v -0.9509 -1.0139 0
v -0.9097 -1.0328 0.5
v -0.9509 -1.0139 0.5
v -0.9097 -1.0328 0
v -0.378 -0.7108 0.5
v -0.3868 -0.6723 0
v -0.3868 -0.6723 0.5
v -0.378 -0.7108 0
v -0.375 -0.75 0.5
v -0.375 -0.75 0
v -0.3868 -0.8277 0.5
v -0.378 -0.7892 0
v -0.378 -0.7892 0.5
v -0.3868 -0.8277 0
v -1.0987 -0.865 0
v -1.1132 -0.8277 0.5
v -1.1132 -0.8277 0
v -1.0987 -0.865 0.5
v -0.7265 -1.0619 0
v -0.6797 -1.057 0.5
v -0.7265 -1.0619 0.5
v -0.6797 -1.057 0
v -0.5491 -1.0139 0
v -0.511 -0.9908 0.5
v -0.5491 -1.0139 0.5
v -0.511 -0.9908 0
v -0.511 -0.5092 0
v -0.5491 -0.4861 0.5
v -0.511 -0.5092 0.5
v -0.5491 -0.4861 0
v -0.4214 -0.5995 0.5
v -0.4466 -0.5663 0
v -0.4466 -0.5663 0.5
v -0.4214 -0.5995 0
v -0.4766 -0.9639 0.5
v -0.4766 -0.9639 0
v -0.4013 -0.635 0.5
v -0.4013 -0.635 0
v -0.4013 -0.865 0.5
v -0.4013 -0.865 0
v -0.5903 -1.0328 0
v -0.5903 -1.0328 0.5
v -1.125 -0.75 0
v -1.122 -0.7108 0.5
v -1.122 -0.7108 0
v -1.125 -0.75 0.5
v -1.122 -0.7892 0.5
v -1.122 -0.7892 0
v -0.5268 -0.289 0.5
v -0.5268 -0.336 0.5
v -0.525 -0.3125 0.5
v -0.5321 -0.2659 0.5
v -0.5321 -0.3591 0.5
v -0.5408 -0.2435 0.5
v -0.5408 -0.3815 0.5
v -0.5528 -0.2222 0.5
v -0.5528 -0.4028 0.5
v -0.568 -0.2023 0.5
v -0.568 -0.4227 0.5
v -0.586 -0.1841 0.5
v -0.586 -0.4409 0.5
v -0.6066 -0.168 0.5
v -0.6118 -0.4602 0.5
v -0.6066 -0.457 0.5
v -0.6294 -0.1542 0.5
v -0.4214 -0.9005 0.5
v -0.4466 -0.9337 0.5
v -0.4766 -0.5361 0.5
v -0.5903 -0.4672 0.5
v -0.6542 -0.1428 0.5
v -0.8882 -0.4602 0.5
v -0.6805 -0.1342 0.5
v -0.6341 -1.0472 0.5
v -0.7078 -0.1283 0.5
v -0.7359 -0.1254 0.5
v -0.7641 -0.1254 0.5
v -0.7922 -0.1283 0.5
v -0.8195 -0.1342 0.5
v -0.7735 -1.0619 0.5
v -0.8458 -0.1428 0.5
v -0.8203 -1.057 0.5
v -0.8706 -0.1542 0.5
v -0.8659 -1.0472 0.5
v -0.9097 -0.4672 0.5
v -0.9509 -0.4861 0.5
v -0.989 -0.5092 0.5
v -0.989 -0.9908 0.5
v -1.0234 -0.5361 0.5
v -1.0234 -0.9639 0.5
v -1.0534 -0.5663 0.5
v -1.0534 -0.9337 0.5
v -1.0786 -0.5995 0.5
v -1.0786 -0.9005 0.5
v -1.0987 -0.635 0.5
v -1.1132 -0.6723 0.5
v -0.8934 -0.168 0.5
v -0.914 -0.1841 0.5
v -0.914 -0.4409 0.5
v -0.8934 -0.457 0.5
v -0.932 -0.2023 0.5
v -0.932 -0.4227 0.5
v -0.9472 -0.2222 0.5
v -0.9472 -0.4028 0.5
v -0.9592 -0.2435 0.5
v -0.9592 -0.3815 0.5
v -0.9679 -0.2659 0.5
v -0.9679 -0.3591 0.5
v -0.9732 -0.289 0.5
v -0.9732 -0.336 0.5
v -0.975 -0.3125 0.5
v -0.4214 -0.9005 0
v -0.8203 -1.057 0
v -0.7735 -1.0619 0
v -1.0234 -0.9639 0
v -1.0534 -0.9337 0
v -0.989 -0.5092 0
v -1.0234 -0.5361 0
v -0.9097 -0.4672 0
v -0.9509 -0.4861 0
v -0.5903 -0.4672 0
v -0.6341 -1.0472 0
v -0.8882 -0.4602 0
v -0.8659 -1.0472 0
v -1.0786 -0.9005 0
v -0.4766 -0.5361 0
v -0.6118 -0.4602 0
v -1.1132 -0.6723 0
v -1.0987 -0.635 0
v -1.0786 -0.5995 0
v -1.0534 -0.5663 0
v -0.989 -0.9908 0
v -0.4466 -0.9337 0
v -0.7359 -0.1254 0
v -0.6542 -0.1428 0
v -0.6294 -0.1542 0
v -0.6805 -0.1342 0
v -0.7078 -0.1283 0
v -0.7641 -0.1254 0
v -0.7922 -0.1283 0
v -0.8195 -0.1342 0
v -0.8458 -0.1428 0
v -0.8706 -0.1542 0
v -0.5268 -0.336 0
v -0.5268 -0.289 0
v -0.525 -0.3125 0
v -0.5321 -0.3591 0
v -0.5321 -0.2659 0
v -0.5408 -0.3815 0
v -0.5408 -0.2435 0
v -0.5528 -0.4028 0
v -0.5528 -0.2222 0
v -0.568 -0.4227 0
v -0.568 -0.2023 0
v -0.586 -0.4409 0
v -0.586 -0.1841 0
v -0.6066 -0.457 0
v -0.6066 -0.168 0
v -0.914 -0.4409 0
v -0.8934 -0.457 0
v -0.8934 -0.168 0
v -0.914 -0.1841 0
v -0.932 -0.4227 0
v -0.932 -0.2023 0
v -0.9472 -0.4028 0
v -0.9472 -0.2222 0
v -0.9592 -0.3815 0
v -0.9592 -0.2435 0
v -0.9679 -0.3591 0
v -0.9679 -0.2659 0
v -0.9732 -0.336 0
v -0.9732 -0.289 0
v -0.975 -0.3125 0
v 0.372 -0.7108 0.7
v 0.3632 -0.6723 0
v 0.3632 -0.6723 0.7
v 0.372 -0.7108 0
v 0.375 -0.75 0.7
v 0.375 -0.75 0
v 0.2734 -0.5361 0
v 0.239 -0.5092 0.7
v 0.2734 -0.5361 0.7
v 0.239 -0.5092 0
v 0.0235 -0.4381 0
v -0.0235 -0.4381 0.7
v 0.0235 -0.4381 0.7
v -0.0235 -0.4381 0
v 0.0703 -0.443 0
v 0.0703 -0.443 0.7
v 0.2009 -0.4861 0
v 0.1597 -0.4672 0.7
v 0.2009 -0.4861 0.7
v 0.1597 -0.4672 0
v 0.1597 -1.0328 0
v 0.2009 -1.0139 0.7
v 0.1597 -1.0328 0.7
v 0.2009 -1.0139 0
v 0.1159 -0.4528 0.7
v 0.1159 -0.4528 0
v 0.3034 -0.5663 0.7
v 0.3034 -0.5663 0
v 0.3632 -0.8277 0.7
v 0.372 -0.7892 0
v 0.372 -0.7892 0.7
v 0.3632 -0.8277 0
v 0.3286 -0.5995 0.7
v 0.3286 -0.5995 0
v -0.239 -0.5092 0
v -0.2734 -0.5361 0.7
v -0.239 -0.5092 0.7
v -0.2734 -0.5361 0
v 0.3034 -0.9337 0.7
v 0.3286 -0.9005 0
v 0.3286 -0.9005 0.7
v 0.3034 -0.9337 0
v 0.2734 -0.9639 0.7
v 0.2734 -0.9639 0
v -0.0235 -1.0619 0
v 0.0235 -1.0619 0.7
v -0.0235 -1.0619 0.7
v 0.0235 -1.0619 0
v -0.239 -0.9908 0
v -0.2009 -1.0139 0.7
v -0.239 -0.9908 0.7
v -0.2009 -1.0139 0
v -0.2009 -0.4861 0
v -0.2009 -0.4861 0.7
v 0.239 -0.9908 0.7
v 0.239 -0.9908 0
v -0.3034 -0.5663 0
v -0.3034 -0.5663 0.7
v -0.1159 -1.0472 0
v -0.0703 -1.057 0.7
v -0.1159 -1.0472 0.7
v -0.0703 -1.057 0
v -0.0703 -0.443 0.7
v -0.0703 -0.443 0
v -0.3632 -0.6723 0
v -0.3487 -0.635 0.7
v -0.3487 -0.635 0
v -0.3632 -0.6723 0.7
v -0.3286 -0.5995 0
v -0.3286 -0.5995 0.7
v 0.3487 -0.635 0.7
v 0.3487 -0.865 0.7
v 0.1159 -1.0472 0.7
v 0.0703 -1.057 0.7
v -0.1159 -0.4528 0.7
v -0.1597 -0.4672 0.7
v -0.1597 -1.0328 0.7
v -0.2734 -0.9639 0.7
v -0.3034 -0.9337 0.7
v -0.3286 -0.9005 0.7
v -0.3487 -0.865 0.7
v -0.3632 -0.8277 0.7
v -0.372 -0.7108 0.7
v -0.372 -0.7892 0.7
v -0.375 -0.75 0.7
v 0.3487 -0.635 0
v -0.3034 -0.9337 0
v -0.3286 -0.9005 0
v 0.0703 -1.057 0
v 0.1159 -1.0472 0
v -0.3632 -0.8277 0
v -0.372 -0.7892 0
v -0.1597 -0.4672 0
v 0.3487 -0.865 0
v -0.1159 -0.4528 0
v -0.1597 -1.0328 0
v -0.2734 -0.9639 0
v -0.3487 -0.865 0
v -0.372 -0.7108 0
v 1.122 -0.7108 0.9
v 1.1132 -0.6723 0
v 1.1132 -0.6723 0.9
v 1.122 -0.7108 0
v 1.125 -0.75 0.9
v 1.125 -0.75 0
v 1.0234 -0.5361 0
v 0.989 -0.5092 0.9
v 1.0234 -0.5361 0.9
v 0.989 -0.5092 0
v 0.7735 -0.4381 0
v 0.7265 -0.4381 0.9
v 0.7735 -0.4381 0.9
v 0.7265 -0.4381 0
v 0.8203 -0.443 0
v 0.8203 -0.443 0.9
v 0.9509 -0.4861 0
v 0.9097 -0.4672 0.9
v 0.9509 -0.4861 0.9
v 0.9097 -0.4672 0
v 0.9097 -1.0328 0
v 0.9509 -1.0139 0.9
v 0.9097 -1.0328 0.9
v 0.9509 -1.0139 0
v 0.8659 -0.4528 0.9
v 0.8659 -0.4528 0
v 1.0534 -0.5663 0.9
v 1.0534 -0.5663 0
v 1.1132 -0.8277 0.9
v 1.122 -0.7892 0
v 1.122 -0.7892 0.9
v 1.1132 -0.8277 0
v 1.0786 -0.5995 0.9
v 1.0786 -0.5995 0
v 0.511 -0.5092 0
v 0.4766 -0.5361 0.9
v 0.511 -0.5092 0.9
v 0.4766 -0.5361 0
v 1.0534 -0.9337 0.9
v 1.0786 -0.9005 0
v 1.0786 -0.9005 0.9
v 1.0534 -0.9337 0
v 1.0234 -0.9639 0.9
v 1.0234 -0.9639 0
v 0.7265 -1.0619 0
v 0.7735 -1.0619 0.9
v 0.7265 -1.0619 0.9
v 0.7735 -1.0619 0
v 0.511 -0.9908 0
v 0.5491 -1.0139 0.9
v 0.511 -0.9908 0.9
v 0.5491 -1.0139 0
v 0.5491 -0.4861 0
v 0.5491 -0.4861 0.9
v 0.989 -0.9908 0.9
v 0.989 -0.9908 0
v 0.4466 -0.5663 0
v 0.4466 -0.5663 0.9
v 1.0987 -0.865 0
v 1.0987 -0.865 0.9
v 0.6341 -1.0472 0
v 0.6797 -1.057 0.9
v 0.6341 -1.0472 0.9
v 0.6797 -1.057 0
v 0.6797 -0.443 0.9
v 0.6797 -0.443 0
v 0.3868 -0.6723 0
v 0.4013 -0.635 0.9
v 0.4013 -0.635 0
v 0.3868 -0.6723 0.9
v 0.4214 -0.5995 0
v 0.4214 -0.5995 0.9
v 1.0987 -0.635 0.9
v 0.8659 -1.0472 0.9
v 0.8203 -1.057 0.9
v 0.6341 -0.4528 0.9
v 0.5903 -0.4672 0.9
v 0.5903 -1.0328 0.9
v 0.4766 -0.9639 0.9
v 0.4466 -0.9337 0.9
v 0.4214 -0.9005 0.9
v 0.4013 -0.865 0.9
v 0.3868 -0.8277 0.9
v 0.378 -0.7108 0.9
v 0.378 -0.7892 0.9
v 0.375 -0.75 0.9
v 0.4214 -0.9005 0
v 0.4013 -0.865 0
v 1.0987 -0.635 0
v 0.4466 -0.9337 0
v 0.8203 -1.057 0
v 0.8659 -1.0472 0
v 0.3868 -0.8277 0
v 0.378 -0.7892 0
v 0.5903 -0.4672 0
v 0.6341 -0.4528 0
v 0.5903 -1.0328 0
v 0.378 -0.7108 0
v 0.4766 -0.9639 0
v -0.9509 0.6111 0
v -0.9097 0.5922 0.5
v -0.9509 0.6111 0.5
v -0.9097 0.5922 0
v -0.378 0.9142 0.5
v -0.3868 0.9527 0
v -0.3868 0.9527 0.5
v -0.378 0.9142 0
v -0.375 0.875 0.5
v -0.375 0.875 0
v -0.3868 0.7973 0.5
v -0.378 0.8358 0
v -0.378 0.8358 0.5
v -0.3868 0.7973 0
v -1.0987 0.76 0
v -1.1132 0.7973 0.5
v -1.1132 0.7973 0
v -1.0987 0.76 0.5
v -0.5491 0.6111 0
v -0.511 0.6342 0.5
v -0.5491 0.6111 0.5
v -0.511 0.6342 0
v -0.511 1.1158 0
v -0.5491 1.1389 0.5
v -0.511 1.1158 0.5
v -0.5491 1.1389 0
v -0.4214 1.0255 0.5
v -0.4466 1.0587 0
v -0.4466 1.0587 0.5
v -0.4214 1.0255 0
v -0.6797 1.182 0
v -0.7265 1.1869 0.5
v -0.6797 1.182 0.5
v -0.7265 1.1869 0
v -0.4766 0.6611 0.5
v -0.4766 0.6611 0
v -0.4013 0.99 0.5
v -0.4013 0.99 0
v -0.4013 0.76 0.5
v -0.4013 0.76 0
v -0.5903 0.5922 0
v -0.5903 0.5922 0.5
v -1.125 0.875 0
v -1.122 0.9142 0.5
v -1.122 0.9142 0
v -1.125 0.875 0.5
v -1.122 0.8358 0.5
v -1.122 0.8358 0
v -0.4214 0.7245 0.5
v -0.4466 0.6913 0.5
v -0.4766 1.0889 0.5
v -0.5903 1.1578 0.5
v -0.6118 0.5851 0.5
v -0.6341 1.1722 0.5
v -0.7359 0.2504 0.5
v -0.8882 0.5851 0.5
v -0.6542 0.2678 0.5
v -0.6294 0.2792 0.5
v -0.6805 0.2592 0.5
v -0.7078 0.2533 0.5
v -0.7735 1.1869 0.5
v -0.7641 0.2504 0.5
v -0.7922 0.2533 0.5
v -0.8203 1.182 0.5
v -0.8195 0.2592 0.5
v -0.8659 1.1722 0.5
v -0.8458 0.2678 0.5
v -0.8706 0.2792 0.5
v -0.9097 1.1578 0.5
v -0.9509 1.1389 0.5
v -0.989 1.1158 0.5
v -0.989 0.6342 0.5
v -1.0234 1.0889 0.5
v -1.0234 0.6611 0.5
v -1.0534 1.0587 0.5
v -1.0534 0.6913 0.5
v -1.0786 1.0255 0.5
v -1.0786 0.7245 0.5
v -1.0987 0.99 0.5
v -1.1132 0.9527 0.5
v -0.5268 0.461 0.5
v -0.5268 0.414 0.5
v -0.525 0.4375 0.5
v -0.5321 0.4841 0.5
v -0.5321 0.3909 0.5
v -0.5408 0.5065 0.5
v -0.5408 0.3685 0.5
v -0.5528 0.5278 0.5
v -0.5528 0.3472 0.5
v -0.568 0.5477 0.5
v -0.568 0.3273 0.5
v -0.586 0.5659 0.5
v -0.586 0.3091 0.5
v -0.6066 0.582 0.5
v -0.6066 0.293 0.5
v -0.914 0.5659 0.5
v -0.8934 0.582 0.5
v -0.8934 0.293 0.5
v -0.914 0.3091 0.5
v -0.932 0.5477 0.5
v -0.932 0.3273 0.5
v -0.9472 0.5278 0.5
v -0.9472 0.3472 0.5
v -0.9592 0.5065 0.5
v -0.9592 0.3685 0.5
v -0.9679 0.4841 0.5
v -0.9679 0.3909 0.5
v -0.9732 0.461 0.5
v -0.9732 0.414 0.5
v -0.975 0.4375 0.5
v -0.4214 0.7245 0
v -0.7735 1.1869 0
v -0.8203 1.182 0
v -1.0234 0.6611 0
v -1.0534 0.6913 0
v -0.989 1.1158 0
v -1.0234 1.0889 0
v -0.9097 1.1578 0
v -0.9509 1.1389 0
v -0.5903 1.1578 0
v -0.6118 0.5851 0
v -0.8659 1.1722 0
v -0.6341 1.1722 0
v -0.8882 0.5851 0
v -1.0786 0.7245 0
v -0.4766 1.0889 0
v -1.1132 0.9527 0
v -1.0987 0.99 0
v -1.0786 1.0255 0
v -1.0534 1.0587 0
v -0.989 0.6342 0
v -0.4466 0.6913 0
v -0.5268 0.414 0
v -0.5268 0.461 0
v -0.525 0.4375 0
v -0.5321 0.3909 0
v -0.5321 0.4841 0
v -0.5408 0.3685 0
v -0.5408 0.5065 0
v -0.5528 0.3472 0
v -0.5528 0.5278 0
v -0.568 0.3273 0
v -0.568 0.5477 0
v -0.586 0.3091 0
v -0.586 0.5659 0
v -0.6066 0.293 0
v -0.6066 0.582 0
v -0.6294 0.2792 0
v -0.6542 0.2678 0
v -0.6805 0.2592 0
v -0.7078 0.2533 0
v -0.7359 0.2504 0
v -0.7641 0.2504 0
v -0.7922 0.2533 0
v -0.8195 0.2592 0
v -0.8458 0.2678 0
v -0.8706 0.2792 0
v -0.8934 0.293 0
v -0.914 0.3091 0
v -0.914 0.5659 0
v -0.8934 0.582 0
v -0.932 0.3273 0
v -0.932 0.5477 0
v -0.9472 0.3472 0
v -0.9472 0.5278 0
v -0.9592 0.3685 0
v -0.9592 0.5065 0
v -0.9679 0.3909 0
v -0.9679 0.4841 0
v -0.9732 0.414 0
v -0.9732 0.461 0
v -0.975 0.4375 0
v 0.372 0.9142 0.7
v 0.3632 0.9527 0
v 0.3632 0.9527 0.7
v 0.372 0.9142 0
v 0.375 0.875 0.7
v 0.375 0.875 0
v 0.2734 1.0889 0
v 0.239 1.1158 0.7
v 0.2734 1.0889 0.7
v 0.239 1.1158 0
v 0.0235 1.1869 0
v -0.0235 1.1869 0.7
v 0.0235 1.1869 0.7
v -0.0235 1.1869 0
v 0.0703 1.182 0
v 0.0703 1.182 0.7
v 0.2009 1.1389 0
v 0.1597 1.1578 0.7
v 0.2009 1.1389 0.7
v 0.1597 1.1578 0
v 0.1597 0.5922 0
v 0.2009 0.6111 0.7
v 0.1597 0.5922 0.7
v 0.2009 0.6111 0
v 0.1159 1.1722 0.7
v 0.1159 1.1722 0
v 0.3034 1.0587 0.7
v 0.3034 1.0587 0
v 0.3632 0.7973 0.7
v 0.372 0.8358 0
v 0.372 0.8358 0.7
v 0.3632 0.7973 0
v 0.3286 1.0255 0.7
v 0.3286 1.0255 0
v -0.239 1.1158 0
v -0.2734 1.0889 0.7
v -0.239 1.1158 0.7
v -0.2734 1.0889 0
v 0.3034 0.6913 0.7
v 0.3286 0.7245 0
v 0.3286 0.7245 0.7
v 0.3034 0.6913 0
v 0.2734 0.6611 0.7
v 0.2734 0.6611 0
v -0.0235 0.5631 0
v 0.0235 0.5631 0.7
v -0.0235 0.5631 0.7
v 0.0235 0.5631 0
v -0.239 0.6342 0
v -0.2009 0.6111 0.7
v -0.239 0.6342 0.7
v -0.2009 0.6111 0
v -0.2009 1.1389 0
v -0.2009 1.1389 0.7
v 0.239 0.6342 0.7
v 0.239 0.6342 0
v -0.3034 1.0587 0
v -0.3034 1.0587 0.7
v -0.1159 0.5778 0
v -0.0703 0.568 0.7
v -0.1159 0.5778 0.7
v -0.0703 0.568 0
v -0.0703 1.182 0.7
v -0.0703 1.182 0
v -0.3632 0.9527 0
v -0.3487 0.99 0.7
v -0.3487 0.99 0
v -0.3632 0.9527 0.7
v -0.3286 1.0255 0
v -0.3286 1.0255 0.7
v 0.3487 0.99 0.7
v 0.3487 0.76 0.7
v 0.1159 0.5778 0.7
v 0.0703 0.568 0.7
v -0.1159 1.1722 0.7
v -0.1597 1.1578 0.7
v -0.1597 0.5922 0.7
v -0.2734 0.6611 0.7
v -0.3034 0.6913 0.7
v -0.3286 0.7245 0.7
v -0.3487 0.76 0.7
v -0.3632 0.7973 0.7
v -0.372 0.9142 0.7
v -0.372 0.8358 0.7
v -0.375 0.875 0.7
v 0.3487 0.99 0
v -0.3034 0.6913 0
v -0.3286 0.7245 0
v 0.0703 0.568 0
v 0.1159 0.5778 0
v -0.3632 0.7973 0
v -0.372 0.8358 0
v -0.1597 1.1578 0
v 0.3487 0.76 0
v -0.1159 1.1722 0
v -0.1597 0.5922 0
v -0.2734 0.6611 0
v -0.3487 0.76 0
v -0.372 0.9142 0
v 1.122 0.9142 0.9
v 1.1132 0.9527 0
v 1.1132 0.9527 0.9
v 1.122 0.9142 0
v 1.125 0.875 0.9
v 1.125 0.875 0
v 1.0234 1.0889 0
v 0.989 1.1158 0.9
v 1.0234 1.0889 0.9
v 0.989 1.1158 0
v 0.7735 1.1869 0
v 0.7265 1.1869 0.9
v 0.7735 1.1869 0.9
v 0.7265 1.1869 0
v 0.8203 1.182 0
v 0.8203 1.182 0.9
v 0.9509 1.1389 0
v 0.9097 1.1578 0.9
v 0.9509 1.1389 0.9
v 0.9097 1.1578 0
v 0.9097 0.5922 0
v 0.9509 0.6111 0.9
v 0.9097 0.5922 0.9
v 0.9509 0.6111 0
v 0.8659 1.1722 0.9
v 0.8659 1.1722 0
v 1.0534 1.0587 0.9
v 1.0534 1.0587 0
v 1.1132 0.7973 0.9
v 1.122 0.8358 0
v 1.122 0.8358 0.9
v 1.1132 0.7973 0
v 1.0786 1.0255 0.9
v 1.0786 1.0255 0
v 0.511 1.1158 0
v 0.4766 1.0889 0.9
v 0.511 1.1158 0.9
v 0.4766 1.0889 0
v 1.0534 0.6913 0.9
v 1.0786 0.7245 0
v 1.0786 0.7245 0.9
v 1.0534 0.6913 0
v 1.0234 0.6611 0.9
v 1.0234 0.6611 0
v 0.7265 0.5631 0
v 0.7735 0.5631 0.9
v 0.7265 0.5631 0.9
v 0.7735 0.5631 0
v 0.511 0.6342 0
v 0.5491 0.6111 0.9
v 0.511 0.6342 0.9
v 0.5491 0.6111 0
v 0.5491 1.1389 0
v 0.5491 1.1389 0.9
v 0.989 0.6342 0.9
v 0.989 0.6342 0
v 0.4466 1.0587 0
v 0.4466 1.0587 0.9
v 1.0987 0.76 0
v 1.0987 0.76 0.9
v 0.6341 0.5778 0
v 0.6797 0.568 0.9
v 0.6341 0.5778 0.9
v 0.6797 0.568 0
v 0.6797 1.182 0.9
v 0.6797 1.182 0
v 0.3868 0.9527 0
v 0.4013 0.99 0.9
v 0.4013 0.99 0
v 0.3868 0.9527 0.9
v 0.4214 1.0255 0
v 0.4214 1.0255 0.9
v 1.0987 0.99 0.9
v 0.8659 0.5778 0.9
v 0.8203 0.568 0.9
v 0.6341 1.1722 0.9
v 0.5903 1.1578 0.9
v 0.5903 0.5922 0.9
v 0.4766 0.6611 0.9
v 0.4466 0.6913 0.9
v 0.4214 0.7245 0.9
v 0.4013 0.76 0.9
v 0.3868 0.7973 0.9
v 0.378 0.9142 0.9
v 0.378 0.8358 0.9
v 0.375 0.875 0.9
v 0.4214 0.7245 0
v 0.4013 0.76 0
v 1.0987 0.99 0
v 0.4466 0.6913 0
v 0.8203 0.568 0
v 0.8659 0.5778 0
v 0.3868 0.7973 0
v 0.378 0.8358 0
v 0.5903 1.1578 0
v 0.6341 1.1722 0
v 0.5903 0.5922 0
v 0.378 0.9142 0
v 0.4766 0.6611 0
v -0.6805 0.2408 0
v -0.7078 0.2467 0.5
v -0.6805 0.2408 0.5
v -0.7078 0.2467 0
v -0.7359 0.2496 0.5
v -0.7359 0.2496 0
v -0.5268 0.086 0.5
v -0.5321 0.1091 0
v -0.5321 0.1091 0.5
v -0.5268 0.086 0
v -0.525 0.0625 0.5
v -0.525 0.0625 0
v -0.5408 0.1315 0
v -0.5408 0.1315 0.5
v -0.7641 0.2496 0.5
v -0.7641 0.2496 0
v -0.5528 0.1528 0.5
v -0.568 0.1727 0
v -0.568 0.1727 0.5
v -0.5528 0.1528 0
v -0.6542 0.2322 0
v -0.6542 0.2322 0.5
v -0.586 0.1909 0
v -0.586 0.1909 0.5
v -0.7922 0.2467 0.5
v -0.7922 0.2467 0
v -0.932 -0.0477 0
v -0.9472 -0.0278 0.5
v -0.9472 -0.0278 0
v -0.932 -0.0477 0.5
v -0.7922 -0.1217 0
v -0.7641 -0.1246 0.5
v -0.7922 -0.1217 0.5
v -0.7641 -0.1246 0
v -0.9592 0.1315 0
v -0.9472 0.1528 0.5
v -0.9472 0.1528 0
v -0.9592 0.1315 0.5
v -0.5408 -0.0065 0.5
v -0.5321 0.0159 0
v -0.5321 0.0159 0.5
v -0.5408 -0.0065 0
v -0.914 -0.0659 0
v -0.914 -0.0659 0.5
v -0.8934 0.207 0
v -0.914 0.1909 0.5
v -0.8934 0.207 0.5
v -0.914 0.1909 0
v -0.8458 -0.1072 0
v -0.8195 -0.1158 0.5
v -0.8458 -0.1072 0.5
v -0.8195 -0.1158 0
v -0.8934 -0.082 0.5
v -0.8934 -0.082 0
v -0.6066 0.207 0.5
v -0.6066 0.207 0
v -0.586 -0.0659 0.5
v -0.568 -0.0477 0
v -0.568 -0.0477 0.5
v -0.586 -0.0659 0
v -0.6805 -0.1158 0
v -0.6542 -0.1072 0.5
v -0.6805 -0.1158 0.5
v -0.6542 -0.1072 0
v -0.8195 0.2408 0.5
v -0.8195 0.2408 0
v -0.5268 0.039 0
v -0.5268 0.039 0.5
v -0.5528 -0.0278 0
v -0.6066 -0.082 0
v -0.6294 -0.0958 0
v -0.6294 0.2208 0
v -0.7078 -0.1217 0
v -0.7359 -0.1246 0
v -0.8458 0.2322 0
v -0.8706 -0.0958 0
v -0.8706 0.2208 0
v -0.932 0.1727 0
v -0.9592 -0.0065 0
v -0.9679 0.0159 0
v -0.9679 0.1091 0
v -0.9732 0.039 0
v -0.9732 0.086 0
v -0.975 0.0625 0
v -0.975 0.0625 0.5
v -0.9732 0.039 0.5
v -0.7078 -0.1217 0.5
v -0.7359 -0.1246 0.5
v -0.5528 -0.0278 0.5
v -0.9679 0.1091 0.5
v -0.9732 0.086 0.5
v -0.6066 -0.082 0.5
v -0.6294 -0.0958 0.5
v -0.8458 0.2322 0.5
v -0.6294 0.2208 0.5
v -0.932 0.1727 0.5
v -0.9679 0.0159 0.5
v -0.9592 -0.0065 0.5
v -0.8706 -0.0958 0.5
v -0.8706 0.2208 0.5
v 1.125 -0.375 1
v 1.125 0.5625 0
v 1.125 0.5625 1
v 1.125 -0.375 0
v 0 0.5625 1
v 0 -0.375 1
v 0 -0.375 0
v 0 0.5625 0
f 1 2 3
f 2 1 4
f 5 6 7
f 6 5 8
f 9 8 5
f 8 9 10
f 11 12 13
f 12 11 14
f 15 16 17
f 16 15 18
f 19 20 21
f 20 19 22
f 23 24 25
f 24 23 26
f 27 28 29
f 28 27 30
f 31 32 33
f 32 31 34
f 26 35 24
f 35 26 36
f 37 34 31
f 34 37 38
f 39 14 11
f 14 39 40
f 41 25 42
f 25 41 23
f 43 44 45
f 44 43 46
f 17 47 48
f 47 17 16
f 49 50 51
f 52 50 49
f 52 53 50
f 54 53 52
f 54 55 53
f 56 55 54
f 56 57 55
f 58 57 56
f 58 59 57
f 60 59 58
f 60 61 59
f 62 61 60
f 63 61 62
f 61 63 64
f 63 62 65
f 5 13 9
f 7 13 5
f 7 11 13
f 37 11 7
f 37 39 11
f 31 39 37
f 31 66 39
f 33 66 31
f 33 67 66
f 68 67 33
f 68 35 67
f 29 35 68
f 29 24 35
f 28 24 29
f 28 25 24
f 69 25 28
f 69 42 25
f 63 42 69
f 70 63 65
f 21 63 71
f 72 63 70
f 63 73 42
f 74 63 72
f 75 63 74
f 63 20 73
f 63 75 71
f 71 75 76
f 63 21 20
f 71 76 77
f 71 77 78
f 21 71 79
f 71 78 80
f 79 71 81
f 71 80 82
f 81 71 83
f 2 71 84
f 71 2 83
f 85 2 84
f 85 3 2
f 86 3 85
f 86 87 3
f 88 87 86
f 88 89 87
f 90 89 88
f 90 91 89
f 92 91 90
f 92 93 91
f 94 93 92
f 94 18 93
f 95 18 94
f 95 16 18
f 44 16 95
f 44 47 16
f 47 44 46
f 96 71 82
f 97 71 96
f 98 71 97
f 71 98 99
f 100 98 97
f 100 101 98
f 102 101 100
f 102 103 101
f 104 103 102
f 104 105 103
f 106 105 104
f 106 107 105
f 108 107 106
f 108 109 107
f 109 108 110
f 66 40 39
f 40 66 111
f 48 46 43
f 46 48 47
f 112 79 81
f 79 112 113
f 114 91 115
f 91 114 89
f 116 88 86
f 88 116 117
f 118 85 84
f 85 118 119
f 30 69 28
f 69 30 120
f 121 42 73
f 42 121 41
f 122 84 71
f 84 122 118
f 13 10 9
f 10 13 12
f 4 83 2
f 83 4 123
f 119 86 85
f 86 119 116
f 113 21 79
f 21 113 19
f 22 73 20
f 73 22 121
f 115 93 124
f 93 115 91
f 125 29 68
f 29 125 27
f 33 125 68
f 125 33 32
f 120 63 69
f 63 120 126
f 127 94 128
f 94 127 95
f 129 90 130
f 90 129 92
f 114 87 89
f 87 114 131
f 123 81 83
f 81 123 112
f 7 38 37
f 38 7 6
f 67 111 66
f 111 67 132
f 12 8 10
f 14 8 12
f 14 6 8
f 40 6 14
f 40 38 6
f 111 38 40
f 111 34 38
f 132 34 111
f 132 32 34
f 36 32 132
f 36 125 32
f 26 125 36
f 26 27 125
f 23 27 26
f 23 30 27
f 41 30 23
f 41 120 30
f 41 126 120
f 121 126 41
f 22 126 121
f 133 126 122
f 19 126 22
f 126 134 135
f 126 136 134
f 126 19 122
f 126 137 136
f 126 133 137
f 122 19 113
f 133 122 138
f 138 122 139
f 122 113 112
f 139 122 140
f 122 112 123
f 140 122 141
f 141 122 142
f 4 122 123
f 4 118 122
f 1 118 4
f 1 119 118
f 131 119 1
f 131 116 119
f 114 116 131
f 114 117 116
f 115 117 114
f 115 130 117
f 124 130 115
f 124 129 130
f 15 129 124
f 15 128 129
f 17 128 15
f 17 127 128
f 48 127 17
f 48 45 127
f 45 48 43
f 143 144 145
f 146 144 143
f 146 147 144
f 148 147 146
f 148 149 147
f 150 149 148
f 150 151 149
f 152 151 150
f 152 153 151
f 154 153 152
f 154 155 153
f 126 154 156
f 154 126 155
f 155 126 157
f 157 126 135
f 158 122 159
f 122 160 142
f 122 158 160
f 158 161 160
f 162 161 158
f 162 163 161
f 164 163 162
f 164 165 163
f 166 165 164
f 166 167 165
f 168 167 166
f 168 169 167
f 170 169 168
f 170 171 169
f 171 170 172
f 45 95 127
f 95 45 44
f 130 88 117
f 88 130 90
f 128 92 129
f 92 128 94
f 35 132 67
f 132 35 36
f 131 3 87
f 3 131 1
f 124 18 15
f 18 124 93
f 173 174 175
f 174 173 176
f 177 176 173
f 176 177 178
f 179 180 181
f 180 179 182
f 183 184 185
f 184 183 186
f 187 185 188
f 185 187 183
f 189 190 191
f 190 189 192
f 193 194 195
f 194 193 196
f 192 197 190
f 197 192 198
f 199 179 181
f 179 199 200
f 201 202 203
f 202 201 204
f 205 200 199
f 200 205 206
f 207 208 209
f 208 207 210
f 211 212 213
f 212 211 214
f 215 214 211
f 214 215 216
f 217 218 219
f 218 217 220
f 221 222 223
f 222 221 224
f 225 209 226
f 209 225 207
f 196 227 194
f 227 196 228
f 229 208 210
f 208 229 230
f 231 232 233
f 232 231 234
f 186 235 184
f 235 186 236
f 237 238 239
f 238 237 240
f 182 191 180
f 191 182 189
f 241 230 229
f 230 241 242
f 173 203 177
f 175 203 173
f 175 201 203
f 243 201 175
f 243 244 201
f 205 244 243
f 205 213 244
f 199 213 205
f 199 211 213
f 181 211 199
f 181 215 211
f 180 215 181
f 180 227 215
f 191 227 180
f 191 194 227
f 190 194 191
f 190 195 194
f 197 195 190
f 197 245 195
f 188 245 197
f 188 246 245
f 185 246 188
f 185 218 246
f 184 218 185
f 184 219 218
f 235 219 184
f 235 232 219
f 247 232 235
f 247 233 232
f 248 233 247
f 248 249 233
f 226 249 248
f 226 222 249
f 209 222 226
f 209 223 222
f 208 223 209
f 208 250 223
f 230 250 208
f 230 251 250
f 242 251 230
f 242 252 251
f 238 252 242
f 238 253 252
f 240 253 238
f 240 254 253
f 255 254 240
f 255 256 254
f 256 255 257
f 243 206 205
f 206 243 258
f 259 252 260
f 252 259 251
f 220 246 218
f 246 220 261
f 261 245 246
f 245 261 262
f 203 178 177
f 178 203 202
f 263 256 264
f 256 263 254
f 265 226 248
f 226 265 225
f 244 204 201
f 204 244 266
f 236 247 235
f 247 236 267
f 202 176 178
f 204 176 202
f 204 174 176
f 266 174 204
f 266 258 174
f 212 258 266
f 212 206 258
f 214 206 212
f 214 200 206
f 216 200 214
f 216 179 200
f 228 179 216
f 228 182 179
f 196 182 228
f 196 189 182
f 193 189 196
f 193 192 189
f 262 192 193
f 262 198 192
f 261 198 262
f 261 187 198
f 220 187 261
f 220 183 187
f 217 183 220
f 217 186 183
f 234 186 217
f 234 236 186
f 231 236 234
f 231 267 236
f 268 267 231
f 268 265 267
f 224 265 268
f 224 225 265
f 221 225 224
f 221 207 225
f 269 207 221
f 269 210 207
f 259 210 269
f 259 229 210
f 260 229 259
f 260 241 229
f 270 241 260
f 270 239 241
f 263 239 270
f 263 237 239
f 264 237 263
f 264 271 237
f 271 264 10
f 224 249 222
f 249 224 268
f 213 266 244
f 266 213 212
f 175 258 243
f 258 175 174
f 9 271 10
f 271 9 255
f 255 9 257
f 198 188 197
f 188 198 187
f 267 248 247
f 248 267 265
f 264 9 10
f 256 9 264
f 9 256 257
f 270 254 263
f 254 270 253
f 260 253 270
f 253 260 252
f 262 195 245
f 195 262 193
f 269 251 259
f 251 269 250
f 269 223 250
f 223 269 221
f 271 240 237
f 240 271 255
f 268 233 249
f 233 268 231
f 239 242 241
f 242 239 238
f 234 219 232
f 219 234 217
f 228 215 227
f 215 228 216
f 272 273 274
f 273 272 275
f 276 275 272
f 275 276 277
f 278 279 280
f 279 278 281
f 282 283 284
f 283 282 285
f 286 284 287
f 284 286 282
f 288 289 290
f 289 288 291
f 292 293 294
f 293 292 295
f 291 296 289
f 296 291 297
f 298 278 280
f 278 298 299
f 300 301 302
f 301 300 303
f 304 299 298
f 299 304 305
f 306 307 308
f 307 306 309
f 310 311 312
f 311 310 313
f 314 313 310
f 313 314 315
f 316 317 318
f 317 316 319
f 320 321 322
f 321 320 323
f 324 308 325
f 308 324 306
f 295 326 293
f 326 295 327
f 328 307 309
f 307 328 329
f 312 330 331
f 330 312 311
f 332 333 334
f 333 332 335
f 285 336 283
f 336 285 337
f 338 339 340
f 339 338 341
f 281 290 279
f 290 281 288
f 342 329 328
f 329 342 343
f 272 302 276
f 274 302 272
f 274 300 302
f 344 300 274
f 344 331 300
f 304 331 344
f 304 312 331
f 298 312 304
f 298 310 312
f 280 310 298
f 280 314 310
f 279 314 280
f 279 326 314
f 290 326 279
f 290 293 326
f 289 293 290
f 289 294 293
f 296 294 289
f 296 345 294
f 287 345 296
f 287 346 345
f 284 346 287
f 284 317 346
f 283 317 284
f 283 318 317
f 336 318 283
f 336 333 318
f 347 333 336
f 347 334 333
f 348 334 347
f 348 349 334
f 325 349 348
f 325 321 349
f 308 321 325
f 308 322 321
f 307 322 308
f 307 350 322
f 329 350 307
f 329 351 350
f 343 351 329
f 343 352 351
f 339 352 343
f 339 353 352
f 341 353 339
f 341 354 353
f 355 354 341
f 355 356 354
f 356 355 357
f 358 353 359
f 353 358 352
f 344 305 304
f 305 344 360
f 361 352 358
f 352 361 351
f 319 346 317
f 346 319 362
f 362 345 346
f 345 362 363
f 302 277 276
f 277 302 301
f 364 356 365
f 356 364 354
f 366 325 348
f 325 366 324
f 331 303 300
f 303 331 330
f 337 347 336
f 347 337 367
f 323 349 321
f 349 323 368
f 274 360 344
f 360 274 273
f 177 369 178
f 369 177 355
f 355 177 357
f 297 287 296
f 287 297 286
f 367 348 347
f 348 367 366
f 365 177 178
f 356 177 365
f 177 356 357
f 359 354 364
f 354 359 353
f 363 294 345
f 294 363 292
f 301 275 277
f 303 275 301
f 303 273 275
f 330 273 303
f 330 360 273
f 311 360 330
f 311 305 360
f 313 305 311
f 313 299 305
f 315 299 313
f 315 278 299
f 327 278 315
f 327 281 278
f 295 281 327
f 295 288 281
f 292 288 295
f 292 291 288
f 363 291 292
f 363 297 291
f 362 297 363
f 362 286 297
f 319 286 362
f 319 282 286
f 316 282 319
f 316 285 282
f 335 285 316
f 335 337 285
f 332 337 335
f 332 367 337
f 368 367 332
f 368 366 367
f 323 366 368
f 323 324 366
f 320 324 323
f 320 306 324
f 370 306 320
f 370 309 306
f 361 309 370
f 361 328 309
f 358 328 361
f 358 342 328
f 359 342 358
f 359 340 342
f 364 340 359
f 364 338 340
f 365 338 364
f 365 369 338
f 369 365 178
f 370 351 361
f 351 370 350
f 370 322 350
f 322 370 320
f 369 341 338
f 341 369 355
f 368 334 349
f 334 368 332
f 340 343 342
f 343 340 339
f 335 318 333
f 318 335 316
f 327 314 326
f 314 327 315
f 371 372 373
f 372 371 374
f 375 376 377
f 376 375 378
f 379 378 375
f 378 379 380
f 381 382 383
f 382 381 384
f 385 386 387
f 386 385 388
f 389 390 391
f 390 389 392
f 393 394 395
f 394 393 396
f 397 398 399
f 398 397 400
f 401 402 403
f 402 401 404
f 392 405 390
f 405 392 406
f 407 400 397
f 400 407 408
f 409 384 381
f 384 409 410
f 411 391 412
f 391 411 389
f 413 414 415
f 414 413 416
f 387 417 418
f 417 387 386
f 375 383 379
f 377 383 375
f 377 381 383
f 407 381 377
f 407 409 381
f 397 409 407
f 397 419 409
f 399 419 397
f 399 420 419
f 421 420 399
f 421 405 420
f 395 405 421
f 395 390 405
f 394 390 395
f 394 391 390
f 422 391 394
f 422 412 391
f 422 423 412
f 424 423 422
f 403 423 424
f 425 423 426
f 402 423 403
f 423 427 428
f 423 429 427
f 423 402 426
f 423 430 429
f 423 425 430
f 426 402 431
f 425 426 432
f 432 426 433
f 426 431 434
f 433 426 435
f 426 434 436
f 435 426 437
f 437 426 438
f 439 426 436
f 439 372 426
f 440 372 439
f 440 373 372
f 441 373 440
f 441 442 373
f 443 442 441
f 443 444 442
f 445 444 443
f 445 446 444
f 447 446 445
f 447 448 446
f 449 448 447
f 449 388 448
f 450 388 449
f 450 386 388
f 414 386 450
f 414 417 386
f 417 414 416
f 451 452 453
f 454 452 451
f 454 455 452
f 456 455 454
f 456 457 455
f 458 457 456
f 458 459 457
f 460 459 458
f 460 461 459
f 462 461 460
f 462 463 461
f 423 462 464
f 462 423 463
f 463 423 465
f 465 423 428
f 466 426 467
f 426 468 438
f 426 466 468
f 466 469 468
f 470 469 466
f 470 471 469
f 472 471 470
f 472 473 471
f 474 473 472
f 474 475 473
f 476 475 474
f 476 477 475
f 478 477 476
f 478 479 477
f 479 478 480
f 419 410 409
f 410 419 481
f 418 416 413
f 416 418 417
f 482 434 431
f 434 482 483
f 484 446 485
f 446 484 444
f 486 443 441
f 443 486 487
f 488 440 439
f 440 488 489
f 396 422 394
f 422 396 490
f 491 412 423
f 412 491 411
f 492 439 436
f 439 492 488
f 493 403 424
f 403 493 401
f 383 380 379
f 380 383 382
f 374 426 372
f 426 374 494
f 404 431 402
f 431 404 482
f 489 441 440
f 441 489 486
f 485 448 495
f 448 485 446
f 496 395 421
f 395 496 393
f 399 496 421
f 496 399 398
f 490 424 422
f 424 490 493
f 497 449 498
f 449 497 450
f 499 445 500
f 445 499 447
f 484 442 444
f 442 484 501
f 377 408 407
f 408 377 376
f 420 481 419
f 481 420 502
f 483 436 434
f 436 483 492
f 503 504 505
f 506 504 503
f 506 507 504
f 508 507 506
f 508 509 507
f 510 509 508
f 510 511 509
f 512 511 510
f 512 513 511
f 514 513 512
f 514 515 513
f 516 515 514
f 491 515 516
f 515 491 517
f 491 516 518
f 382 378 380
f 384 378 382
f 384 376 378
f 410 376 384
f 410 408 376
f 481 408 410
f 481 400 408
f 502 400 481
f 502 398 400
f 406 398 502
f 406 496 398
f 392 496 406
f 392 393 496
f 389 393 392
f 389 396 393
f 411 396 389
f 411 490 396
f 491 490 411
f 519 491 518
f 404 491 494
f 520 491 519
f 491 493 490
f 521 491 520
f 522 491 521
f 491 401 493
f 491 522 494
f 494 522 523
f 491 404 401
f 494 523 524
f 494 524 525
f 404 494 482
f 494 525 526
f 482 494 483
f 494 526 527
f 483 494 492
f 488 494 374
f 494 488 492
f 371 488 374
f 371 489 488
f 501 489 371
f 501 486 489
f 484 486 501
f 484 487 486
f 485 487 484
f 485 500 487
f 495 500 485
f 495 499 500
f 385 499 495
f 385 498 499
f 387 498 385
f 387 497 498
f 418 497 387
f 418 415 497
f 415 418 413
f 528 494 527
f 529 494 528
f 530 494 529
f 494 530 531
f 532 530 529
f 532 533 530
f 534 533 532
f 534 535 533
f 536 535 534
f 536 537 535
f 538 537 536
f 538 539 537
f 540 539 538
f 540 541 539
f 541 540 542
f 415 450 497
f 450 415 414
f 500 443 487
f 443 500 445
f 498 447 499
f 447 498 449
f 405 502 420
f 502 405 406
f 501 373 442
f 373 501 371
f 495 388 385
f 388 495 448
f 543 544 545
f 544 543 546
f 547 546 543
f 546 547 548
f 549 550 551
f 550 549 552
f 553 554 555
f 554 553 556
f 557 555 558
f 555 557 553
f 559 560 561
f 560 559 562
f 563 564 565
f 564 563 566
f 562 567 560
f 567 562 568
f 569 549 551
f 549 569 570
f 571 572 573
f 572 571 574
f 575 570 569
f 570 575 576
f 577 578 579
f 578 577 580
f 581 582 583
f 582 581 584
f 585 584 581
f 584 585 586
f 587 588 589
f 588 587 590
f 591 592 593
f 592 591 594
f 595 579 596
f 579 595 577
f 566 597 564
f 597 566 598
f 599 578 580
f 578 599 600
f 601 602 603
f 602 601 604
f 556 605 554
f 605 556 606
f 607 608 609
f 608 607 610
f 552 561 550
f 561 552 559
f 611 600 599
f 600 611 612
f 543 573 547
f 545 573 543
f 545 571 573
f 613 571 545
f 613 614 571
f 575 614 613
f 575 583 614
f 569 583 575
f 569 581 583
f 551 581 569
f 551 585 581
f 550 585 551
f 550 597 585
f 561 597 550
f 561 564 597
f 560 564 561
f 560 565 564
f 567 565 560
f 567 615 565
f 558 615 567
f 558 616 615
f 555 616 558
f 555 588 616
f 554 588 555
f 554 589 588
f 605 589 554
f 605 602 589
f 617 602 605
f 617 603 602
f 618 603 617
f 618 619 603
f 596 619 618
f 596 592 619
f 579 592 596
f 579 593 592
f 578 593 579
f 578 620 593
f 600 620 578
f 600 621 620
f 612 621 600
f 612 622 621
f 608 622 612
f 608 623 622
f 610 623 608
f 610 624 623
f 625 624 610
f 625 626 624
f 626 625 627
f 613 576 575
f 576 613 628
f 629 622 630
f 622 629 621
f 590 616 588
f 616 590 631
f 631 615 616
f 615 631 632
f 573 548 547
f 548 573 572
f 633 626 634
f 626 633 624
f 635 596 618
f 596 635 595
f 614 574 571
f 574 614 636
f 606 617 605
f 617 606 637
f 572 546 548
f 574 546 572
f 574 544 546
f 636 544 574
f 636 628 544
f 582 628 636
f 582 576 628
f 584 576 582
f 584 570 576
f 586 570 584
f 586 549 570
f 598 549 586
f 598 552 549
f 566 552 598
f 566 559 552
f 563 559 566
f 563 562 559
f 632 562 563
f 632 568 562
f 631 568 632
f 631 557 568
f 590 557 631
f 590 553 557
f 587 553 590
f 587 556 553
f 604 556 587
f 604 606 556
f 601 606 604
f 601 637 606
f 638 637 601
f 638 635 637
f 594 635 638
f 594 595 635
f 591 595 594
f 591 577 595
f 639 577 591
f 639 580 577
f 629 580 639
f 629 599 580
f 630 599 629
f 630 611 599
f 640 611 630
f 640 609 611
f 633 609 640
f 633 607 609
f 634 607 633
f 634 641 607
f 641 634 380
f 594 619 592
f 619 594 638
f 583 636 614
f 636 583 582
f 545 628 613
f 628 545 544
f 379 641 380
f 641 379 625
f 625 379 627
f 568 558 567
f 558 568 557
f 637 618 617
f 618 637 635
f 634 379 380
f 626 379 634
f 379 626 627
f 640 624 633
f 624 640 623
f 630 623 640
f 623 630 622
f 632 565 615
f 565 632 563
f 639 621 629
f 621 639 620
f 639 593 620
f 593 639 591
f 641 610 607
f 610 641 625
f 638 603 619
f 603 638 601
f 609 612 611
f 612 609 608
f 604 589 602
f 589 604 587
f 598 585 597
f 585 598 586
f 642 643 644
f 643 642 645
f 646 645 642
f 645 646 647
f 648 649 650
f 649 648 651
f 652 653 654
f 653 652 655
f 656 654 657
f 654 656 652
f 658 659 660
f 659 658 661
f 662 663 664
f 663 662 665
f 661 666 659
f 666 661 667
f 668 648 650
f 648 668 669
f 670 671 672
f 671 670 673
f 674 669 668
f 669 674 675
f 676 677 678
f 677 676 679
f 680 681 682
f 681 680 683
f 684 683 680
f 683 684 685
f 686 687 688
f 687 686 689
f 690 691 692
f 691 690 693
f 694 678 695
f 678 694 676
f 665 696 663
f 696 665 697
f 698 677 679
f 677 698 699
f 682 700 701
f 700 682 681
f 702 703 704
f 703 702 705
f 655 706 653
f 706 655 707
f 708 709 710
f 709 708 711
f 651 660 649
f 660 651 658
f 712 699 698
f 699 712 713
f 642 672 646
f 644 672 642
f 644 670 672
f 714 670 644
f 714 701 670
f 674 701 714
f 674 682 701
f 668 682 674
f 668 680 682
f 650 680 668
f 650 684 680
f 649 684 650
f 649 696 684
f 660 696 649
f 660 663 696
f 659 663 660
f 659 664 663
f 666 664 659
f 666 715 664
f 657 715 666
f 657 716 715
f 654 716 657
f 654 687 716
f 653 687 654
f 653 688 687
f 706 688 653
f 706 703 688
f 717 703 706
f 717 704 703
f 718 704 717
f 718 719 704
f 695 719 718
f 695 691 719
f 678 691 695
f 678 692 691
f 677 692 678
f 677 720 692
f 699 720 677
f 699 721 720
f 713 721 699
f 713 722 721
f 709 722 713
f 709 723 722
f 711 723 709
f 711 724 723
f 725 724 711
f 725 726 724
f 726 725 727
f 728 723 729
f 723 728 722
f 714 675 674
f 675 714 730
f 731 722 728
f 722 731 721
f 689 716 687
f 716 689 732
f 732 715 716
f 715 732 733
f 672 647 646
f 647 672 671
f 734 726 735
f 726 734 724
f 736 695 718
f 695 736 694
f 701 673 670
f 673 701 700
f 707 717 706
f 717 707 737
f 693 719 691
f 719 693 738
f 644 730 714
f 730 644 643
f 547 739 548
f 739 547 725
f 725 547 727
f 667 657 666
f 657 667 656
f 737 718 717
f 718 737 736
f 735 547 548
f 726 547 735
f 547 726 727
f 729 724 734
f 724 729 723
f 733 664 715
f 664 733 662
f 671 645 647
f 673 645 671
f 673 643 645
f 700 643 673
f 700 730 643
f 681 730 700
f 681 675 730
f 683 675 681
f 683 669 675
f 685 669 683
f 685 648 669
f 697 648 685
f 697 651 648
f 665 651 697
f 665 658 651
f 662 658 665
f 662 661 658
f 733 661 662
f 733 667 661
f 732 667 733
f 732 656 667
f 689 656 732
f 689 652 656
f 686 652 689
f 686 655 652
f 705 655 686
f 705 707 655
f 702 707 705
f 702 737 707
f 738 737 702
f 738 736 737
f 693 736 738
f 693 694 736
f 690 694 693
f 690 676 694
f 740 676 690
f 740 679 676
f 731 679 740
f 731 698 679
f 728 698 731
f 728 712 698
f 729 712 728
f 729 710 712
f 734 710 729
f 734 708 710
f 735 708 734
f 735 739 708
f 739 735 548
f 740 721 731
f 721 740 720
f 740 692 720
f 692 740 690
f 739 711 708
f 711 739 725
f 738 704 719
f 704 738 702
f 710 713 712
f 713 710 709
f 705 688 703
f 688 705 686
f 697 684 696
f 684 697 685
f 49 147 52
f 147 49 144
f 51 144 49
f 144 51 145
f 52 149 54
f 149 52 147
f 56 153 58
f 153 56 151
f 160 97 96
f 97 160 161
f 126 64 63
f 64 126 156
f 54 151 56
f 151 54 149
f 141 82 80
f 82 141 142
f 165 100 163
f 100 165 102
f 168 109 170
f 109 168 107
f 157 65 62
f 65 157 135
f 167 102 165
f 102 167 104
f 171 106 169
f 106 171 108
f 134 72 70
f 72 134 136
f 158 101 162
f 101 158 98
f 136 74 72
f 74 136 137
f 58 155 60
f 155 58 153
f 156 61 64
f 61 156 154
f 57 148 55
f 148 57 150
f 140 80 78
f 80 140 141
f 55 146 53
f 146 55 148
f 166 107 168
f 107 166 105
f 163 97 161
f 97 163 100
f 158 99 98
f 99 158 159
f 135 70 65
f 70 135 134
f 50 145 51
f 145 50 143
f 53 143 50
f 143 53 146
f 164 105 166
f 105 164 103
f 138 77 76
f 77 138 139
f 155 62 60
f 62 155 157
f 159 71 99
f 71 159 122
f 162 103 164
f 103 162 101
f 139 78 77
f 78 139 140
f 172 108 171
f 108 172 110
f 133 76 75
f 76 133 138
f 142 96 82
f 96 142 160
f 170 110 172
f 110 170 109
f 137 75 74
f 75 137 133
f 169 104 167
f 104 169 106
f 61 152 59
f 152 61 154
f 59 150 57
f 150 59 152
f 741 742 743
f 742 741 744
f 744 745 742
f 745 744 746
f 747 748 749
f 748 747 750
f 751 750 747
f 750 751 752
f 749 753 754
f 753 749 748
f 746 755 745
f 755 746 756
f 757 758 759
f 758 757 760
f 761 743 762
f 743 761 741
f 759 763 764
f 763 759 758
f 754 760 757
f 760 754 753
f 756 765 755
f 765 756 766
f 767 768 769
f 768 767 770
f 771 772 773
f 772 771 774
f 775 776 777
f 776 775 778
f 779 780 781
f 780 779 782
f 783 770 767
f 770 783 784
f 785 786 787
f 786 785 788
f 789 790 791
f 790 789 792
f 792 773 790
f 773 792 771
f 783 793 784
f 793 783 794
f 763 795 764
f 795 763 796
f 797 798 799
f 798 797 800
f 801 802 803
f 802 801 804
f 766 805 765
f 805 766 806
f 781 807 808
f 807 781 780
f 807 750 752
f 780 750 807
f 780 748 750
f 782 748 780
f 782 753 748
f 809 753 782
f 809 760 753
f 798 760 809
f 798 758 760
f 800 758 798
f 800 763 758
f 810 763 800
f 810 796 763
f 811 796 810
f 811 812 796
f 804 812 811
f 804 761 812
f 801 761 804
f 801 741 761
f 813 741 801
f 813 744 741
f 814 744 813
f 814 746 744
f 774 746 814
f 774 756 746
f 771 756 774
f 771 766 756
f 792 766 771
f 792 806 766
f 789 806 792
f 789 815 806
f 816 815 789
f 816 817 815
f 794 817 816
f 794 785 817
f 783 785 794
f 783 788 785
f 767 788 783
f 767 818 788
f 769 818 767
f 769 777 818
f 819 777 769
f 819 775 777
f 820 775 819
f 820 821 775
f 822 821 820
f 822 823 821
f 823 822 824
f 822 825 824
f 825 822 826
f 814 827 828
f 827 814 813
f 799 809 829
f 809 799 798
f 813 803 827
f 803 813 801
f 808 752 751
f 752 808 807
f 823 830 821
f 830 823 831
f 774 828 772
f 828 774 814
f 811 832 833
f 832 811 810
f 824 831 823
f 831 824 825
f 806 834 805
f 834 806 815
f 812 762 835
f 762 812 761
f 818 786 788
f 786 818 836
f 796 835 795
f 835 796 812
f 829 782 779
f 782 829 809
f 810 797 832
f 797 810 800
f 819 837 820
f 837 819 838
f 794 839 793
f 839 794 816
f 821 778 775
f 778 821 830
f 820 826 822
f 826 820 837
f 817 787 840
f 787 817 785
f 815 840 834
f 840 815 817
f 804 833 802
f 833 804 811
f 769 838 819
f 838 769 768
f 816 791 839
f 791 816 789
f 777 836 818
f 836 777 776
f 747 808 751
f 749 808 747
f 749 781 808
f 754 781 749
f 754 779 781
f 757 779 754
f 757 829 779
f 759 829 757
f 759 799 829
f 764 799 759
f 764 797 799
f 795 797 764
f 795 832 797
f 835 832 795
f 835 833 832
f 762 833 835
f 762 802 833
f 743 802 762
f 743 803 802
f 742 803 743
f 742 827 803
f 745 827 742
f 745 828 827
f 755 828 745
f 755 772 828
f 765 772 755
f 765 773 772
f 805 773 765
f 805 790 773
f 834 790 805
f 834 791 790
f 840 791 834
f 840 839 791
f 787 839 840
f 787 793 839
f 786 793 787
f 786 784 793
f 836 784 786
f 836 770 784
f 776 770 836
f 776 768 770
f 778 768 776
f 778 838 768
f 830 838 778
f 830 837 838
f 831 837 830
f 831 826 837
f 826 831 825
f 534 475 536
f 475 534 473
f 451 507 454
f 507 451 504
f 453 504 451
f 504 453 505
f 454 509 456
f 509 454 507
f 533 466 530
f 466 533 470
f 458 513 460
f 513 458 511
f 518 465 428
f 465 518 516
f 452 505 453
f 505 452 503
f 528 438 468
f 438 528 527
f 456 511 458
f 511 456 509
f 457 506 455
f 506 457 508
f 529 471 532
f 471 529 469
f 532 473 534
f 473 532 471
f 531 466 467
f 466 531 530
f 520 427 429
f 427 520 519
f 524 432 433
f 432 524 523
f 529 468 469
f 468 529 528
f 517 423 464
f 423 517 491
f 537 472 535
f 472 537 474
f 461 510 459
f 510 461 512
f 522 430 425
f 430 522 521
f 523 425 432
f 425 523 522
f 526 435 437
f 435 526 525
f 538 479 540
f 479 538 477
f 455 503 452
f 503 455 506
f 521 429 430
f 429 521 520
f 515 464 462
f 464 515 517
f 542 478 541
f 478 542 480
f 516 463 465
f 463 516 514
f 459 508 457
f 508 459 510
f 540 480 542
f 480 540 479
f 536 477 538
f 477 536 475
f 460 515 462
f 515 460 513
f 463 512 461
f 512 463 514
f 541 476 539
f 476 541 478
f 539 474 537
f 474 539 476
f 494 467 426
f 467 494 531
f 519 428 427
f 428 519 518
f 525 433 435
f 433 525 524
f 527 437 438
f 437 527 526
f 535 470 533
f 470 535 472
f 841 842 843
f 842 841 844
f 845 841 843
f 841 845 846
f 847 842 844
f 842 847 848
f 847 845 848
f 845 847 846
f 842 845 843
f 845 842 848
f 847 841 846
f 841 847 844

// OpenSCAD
$fn=50;

translate([-0.75, -0.75, 0])
scale([1.5, 1.25, 1]) {
  translate([0.5, 0.3, 0])
    cube([0.75,0.75,1]);
  
  for(j = [0:1]) {
    translate([0, j *1.3, 0])
        for(i = [0:2]) {
          translate([i/2, 0, 0])
            cylinder(0.5+i/5, 0.25, 0.25);
          
        };
  };
  
  translate([0, 0.05, 0])
    for (i = [1:3]) {
      width=0.3;
      translate([0, i * width, 0])
        cylinder(0.5, width/2, width/2);
    }
}
